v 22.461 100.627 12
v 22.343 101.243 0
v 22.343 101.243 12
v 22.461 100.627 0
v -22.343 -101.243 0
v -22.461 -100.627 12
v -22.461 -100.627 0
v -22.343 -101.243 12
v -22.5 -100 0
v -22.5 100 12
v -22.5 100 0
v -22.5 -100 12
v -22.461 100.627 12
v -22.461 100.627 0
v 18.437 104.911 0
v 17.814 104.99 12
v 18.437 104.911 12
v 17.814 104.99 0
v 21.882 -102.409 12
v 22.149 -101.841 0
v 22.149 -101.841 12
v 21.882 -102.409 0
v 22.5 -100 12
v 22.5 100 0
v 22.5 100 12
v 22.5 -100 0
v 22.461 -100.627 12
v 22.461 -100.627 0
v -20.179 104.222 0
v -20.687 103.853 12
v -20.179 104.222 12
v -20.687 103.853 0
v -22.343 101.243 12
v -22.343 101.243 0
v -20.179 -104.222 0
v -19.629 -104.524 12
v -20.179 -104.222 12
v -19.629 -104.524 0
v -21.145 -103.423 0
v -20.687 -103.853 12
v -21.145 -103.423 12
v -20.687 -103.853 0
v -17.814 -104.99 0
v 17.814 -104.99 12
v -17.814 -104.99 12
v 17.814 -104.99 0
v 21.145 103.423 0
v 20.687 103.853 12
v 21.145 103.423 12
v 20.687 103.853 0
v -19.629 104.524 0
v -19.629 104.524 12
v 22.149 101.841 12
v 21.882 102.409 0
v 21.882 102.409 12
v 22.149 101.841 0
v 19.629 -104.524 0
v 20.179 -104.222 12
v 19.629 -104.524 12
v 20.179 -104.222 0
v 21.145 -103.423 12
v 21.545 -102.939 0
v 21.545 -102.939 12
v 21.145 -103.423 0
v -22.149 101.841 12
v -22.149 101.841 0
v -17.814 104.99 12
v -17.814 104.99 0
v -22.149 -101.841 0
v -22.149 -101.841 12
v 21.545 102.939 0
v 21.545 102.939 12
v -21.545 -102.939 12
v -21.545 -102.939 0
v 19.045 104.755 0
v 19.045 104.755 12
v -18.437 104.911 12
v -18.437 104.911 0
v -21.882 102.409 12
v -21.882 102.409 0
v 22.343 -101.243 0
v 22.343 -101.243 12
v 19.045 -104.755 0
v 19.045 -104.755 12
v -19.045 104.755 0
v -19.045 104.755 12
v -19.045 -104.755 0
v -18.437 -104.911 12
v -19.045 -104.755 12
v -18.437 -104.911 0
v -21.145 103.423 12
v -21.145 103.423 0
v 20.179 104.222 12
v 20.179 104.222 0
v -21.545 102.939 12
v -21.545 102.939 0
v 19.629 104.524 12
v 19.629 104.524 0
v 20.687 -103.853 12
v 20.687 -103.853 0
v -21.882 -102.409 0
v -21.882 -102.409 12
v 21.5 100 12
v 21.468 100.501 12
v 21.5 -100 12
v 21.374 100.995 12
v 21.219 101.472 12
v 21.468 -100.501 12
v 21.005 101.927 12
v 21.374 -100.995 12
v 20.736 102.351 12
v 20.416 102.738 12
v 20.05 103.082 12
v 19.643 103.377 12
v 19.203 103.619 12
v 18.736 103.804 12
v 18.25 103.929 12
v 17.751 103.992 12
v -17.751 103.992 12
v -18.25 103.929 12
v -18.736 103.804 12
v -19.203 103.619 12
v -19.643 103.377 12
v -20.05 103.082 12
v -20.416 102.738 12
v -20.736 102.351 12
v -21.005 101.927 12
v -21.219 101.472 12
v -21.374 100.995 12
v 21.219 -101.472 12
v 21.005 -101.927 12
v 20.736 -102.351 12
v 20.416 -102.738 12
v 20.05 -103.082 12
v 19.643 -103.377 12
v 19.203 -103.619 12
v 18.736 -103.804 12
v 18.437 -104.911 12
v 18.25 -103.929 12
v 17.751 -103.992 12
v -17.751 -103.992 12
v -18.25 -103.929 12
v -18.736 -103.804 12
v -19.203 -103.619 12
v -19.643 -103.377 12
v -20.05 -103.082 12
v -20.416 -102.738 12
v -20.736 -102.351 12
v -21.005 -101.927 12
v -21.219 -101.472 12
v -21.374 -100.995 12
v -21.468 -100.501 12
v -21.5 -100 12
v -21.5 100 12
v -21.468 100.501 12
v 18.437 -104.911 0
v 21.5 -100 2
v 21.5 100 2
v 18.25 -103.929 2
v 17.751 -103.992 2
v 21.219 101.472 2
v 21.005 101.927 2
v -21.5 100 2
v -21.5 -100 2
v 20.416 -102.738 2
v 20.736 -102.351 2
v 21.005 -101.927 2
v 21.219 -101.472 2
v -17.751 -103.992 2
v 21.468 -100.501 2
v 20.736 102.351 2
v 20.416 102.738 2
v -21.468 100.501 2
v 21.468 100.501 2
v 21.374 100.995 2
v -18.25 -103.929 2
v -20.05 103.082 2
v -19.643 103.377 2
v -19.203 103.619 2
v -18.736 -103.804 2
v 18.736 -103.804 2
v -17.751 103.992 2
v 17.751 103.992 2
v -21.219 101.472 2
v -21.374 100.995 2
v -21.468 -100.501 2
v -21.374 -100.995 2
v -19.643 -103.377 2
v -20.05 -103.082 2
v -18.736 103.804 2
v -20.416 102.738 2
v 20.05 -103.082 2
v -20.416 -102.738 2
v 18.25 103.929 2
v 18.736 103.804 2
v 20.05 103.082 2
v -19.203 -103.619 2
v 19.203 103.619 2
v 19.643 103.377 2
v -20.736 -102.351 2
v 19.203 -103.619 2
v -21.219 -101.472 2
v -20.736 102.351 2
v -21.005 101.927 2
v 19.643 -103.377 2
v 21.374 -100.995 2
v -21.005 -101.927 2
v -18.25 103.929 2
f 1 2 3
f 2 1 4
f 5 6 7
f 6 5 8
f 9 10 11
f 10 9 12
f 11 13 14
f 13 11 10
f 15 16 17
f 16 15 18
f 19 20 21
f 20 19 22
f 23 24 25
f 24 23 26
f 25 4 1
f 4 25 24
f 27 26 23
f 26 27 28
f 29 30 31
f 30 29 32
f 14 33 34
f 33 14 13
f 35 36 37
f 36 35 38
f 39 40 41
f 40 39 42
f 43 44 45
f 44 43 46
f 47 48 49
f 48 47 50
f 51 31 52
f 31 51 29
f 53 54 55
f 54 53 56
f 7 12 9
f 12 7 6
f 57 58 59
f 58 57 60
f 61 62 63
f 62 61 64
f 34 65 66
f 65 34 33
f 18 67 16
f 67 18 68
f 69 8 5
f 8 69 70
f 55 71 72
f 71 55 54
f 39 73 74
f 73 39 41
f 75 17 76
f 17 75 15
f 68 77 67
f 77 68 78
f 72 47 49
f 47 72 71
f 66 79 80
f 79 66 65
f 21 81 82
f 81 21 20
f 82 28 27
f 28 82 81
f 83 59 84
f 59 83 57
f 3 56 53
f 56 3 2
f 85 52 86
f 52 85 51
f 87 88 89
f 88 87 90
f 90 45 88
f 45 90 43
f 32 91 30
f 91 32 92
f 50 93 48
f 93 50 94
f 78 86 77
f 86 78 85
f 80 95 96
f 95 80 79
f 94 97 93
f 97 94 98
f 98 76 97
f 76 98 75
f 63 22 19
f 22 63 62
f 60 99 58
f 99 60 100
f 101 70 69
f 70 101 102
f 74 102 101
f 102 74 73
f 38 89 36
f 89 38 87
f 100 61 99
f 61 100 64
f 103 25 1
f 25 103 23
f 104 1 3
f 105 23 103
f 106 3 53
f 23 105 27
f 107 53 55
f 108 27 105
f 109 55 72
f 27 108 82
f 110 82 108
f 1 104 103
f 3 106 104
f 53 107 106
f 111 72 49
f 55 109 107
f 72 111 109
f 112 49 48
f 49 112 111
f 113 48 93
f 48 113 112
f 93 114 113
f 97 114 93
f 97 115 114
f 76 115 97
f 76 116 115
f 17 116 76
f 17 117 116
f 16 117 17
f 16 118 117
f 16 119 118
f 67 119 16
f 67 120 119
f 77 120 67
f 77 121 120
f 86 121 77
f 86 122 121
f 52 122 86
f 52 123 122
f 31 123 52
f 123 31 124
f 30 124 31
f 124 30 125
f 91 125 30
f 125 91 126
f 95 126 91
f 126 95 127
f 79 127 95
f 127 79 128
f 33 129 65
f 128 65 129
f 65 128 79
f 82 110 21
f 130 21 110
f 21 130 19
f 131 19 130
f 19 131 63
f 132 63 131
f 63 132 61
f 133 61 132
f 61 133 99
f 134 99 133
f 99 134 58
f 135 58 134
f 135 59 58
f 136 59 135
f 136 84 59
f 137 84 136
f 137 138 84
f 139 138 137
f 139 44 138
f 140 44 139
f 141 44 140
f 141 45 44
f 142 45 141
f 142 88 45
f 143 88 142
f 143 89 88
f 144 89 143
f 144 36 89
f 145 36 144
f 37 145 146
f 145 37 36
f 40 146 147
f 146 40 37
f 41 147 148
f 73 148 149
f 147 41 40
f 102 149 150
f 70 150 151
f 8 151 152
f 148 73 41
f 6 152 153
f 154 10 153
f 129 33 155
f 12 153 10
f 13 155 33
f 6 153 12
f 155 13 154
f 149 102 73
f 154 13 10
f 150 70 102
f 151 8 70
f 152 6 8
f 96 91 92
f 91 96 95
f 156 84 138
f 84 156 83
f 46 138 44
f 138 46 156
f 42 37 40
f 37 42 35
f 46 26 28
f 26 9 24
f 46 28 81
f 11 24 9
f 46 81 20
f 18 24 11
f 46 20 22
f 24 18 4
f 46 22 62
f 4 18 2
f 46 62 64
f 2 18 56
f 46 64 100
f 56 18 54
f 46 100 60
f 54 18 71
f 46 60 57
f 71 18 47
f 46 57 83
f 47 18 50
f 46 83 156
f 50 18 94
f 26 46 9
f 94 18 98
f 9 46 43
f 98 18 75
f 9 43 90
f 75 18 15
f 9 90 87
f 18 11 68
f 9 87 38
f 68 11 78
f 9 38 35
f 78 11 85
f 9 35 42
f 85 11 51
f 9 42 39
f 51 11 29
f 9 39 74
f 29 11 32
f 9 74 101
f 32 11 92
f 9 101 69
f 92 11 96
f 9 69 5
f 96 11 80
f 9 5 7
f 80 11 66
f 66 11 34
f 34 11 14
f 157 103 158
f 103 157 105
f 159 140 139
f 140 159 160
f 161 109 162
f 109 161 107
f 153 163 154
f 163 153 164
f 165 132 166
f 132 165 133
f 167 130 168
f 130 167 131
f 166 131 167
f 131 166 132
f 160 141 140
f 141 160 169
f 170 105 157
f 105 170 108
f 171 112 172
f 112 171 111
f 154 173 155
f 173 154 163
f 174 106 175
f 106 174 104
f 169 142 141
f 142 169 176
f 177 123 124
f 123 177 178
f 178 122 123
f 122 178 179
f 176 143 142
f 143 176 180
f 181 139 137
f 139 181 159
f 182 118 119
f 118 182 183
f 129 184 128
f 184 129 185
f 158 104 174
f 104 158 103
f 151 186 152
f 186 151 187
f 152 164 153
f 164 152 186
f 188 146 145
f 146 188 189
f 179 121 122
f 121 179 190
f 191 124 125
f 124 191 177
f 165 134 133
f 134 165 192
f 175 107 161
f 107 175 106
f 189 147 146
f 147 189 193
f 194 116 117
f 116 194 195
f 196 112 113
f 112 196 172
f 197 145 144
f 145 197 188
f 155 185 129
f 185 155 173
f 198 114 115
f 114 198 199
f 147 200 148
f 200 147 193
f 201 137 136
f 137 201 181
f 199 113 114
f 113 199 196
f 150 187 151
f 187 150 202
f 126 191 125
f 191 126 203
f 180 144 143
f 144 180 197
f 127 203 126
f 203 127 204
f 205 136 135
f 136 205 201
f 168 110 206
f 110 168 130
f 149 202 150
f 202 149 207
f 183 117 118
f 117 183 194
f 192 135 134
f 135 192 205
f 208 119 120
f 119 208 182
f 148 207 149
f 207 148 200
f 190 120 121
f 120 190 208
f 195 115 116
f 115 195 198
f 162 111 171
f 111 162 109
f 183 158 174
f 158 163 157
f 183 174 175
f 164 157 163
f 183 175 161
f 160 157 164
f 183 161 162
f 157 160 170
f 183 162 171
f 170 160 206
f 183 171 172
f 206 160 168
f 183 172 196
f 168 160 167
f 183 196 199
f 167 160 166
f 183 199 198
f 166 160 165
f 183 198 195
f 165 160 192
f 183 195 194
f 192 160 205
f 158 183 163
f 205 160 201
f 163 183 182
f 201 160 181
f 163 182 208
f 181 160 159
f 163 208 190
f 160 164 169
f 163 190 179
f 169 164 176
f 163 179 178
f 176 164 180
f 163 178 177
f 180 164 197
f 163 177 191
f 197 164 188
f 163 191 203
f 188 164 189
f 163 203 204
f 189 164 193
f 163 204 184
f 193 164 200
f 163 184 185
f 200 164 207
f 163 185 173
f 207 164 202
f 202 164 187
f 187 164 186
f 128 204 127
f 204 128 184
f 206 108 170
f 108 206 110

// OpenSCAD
$fn = 50;


difference() {
	union() {
		hull() {
			translate(v = [-17.5000000000, 100.0000000000, 0]) {
				cylinder(h = 12, r = 5);
			}
			translate(v = [17.5000000000, 100.0000000000, 0]) {
				cylinder(h = 12, r = 5);
			}
			translate(v = [-17.5000000000, -100.0000000000, 0]) {
				cylinder(h = 12, r = 5);
			}
			translate(v = [17.5000000000, -100.0000000000, 0]) {
				cylinder(h = 12, r = 5);
			}
		}
	}
	union() {
		translate(v = [0, 0, 2]) {
			hull() {
				translate(v = [-17.5000000000, 100.0000000000, 0]) {
					cylinder(h = 10, r = 4);
				}
				translate(v = [17.5000000000, 100.0000000000, 0]) {
					cylinder(h = 10, r = 4);
				}
				translate(v = [-17.5000000000, -100.0000000000, 0]) {
					cylinder(h = 10, r = 4);
				}
				translate(v = [17.5000000000, -100.0000000000, 0]) {
					cylinder(h = 10, r = 4);
				}
			}
		}
	}
}
